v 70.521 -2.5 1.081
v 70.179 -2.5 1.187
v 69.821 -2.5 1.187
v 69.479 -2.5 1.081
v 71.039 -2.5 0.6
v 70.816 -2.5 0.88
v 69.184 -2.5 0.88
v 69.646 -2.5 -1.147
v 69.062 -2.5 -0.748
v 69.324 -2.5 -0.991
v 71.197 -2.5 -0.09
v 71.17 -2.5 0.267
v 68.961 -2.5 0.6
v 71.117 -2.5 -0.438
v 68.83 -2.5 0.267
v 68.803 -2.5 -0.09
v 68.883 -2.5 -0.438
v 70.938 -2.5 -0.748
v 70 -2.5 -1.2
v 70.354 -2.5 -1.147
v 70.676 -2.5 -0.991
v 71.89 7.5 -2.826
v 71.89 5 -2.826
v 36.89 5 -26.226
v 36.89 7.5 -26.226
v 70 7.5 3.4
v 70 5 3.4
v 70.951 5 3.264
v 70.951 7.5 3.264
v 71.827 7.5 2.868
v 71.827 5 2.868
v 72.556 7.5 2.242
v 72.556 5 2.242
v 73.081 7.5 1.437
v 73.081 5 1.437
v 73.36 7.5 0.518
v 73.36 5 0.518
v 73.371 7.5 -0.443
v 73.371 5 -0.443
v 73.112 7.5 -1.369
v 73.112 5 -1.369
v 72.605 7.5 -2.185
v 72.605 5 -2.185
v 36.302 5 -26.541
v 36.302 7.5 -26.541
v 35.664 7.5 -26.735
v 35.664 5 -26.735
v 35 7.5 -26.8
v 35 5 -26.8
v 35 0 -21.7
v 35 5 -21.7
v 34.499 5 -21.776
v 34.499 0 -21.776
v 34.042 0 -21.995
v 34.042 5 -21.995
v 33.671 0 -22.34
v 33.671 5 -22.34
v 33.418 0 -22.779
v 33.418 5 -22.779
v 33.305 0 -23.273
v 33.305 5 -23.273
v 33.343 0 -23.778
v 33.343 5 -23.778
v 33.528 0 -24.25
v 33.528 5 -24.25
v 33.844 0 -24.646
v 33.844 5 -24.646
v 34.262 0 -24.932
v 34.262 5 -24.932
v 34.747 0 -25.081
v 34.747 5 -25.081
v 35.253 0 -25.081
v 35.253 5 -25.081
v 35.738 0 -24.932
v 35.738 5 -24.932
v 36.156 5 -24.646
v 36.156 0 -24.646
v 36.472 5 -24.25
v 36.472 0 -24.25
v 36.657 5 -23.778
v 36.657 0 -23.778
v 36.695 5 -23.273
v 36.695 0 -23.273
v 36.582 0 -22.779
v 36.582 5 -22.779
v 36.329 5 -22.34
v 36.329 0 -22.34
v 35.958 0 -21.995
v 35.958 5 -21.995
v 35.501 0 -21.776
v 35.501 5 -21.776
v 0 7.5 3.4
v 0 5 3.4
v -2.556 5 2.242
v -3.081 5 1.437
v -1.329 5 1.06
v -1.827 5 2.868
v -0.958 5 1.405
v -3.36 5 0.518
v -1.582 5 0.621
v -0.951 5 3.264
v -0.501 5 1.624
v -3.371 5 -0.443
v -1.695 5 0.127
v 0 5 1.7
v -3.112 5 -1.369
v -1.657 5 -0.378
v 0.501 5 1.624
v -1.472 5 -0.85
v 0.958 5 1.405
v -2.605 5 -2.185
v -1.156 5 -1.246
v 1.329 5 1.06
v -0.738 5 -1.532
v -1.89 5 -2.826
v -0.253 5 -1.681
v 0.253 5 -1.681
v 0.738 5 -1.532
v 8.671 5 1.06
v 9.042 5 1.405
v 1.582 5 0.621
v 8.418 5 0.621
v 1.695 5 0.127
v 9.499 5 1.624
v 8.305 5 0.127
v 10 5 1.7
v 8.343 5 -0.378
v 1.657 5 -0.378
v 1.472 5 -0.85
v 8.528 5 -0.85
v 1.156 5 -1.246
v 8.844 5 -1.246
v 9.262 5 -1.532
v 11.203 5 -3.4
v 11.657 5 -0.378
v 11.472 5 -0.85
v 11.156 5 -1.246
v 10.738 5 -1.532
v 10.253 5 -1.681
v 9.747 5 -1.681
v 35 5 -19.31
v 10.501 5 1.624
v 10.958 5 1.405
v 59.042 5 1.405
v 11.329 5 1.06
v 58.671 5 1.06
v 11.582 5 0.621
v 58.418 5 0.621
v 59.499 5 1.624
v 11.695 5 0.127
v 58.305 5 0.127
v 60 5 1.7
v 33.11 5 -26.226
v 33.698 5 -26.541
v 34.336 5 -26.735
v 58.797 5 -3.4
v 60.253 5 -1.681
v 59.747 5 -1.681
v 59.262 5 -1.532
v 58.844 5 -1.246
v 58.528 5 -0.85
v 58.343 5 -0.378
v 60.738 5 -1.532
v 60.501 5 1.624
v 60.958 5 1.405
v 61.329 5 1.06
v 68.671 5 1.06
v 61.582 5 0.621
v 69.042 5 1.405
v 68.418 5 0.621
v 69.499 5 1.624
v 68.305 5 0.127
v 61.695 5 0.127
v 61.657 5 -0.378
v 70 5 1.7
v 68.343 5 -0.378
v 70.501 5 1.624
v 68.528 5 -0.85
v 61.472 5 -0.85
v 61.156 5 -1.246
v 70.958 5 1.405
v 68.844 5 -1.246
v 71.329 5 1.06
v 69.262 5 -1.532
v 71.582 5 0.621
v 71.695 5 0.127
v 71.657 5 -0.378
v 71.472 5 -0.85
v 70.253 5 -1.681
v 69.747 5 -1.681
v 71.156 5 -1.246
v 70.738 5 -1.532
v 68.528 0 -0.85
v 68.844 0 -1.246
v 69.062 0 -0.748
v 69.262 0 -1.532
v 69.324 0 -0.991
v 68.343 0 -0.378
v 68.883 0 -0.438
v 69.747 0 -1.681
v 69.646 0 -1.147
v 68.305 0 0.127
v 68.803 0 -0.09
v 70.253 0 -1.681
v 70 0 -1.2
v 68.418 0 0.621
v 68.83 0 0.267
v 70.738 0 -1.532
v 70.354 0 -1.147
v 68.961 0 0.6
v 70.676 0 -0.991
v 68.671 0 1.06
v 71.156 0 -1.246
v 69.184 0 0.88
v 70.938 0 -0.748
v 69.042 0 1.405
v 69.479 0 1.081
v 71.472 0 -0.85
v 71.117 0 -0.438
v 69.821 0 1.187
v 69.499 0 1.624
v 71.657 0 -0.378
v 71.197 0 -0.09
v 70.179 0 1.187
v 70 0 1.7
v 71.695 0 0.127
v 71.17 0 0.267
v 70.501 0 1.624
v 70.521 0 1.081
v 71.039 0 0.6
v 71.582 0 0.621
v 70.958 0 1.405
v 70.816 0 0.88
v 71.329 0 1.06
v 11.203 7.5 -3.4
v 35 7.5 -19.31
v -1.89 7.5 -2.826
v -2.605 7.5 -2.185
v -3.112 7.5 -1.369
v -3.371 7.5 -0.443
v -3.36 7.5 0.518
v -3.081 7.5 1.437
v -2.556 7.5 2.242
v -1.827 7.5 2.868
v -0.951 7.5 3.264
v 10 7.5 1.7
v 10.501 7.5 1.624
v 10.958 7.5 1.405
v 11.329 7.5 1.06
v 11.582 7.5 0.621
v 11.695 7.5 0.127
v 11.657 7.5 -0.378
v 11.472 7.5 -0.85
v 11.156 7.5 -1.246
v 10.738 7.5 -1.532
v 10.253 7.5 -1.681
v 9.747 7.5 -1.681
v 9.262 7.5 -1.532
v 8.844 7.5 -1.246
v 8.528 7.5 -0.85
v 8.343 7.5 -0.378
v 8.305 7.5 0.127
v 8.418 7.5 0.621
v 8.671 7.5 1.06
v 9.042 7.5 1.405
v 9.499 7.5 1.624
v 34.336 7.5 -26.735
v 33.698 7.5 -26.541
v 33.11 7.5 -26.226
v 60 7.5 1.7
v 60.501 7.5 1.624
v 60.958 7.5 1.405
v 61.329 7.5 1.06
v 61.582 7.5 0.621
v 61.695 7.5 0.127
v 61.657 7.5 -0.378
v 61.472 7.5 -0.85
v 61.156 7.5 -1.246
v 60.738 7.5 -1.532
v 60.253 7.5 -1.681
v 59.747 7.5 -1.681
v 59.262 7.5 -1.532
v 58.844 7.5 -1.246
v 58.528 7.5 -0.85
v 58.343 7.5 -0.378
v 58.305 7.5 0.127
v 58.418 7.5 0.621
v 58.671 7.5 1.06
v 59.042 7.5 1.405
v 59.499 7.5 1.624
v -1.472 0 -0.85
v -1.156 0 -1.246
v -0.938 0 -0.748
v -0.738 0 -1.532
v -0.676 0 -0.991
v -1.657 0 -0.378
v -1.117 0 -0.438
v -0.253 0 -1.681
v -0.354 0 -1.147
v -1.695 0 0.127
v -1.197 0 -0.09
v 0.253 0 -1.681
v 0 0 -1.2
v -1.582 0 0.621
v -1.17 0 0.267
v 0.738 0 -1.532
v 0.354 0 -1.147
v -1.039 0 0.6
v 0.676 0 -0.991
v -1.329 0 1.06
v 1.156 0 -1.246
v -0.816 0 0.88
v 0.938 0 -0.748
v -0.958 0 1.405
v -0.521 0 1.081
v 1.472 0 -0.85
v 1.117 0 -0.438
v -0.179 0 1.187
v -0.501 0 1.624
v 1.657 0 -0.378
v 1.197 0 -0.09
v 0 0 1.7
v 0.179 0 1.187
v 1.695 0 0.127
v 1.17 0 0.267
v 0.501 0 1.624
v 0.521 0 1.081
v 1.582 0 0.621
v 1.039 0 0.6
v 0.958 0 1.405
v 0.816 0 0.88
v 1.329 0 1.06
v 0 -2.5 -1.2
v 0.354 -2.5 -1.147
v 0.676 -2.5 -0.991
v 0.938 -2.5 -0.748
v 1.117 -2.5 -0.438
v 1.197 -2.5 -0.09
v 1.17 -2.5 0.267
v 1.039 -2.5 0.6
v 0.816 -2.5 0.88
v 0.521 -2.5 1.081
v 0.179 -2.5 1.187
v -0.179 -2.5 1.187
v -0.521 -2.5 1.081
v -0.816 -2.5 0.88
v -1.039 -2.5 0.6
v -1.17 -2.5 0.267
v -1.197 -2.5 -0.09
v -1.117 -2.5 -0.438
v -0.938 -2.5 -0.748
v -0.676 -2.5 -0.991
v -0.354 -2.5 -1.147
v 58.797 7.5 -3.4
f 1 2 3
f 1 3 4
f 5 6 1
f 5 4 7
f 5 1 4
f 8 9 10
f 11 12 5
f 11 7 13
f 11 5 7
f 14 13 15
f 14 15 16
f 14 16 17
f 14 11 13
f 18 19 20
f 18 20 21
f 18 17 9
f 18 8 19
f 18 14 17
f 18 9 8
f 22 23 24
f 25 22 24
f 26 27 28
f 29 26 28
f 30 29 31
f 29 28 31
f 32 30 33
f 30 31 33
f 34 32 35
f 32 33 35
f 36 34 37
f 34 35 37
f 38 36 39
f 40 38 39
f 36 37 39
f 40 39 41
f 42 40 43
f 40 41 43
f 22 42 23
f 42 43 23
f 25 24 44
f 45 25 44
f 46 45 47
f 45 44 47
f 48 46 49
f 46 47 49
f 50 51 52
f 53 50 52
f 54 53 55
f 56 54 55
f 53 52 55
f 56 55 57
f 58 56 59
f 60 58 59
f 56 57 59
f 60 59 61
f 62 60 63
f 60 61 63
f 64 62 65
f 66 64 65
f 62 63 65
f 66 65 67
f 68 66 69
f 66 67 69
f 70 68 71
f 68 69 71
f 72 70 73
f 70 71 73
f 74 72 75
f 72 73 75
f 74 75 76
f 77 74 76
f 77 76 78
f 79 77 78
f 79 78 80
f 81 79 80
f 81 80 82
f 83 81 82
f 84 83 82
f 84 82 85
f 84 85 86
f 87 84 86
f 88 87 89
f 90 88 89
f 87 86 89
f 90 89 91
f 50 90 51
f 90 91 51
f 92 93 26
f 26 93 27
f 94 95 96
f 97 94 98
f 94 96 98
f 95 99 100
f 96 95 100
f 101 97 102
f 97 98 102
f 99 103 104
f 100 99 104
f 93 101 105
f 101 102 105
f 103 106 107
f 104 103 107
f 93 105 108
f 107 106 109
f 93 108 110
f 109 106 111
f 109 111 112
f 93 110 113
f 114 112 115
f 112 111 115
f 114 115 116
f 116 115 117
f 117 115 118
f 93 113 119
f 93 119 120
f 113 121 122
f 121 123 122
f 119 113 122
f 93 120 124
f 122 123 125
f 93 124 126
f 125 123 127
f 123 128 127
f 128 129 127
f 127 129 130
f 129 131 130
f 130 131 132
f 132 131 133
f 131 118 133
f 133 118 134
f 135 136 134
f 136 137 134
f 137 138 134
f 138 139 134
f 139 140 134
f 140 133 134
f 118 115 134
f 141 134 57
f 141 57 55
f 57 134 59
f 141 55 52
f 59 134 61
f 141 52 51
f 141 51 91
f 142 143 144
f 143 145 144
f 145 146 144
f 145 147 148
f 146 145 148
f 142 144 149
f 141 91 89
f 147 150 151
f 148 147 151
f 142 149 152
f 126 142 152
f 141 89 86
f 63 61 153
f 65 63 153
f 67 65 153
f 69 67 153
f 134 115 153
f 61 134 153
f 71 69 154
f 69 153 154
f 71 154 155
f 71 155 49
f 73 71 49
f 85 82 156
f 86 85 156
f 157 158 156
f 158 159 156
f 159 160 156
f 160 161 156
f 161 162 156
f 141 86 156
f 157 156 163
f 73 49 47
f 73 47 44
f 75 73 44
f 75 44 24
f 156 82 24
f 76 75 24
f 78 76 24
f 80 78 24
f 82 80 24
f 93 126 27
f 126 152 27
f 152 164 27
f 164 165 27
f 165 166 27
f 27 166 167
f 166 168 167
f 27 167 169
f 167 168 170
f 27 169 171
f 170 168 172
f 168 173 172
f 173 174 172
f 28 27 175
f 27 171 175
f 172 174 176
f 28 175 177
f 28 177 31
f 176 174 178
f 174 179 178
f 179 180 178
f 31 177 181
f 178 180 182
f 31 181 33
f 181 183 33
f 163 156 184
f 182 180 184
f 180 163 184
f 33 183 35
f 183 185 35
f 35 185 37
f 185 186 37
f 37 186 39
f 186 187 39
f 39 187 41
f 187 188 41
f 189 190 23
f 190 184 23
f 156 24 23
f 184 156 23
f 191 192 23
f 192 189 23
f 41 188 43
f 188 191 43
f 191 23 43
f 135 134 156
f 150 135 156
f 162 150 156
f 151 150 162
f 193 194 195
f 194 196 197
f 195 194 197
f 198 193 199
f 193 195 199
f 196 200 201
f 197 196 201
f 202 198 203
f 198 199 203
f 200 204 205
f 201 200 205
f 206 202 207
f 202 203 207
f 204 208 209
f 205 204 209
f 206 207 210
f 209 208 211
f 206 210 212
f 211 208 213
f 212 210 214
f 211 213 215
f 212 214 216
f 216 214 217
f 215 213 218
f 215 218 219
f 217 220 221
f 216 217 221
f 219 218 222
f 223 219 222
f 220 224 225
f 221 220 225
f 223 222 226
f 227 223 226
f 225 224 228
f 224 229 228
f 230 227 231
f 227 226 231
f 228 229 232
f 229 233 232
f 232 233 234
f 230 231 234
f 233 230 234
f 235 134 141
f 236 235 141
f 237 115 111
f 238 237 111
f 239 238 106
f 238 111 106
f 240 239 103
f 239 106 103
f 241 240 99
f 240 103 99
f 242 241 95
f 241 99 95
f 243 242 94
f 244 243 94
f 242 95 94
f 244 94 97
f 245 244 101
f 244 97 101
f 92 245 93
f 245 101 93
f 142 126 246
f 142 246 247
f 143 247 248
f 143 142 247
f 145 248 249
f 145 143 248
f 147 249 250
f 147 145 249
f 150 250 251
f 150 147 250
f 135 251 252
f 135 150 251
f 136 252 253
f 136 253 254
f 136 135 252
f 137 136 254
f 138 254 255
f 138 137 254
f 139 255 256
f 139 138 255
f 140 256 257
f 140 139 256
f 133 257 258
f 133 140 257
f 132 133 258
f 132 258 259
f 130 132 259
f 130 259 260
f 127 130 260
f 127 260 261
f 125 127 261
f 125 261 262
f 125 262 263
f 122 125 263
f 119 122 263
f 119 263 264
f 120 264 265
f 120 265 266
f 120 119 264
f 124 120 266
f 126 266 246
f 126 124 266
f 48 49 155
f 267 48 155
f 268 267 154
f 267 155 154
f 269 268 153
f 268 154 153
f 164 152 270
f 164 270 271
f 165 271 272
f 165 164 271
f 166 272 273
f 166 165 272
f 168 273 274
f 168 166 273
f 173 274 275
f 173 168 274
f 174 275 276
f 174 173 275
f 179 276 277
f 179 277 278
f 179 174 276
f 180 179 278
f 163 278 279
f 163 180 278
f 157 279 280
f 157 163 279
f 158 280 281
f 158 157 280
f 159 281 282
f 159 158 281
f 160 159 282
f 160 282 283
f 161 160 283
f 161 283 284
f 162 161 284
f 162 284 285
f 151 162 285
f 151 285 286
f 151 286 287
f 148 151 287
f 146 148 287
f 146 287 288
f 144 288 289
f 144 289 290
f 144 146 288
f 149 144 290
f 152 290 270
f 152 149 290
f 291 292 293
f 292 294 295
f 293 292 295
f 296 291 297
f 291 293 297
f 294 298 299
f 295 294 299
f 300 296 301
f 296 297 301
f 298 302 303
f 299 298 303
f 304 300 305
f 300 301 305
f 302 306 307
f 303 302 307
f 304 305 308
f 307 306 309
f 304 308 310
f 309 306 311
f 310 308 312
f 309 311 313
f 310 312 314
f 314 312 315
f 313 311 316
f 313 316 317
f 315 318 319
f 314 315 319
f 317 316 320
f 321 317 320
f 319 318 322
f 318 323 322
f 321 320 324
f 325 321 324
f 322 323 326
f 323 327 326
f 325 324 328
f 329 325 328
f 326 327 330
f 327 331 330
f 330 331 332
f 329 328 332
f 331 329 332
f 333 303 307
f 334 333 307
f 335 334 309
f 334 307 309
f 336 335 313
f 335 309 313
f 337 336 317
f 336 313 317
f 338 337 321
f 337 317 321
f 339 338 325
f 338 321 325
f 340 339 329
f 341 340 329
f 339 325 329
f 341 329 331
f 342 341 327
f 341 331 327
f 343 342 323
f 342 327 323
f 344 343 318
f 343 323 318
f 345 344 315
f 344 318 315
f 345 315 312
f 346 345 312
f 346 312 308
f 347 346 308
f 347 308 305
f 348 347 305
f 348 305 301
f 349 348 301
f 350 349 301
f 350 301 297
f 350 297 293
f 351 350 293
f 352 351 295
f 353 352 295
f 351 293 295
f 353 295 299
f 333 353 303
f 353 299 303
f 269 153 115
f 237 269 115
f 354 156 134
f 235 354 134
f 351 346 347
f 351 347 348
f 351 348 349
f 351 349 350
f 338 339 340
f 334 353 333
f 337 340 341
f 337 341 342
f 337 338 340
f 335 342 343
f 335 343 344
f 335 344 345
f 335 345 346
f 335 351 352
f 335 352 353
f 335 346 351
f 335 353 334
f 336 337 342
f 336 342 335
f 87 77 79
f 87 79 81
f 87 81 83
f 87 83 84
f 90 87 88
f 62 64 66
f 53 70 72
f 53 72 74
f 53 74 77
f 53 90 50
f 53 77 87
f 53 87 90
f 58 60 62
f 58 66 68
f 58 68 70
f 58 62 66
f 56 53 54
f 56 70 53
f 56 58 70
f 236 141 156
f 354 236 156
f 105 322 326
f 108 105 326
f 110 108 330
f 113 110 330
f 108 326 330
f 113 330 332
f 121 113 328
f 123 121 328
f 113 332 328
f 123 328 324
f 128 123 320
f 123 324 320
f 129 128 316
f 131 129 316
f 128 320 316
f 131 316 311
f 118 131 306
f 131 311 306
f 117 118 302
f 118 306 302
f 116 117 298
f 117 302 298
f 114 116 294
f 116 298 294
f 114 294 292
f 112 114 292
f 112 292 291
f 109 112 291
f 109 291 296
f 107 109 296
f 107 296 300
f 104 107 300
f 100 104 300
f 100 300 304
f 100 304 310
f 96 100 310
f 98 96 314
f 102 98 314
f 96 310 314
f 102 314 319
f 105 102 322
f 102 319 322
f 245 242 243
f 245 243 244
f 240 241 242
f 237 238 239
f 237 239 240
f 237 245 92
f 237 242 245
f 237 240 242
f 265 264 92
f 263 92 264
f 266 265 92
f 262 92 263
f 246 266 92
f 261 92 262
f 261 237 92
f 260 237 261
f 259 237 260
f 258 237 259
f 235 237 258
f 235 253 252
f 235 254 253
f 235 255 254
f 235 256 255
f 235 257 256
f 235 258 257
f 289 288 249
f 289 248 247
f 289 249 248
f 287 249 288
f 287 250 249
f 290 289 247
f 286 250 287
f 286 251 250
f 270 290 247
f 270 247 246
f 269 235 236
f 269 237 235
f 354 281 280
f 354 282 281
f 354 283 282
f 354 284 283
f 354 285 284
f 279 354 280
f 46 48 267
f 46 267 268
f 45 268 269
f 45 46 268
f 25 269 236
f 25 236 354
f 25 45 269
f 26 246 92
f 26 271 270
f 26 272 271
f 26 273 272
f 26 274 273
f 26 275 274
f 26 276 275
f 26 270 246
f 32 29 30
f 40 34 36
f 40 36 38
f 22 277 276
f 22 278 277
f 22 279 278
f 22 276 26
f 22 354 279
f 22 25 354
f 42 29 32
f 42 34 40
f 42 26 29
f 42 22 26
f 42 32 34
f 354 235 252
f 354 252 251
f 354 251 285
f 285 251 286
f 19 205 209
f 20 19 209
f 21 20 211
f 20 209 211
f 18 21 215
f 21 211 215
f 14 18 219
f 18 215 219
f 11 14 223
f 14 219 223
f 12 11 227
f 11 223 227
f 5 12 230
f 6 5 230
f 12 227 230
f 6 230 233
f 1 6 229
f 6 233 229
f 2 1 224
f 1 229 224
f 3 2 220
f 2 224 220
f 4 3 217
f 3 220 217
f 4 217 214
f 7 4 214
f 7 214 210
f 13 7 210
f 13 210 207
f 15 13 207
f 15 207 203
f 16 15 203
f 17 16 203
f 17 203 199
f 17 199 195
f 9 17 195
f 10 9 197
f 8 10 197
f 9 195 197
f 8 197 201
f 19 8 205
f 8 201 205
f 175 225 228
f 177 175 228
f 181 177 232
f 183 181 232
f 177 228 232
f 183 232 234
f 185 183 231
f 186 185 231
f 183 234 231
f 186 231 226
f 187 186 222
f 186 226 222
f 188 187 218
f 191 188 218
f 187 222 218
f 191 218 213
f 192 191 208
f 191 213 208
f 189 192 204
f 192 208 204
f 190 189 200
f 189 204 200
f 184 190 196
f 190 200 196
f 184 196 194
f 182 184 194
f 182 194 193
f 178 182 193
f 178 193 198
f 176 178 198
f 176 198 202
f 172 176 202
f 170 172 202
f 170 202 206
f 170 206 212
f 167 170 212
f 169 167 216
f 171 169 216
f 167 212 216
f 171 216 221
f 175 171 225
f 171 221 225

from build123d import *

# Parameters (mm, degrees)
SKETCH1_R             = 1.7
BOSS_EXTRUDE1_DEPTH   = 5
BOSS_EXTRUDE1_2_DEPTH = 5
SKETCH2_R             = 1.7
BOSS_EXTRUDE5_DEPTH   = 2.5
SKETCH3_R             = 1.2
BOSS_EXTRUDE6_DEPTH   = 2.5
SKETCH4_R             = 1.7
BOSS_EXTRUDE7_DEPTH   = 5


with BuildPart() as part:
    # Sketch1 → Boss-Extrude1 (new body)
    with BuildSketch(Plane(origin=(0, 0, 0), x_dir=(1, 0, 0), z_dir=(0, 1, 0))):
        with Locations(Location((0, 0, 0), (0, 0, 270))):
            Circle(SKETCH1_R)
    extrude(amount=BOSS_EXTRUDE1_DEPTH)



with BuildPart() as body_2:
    # Sketch1 → Boss-Extrude1 2 (new body)
    with BuildSketch(Plane(origin=(0, 0, 0), x_dir=(1, 0, 0), z_dir=(0, 1, 0))):
        with Locations(Location((70, 0, 0), (0, 0, 270))):
            Circle(SKETCH1_R)
    extrude(amount=BOSS_EXTRUDE1_2_DEPTH)


with BuildPart() as part_1:
    add(part.part)

    add(body_2.part)  # Boss-Extrude5 merges body 2
    # Sketch2 → Boss-Extrude5 (add)
    # profile 1 of 4: a face of its own
    with BuildSketch(Plane(origin=(0, 5, 0), x_dir=(1, 0, 0), z_dir=(0, 1, 0))):
        with BuildLine():
            ThreePointArc((-1.889706262, 2.826483725), (-0.987409575, 3.253463129), (0, 3.4))
            Line((0, 3.4), (11.202822944, 3.4))
            Line((11.202822944, 3.4), (35, 19.310112661))
            Line((35, 19.310112661), (35, 23.4))
            Line((35, 23.4), (35, 26.8))
            ThreePointArc((35, 26.8), (34.012590425, 26.653463129), (33.110293738, 26.226483725))
            Line((33.110293738, 26.226483725), (-1.889706262, 2.826483725))
        make_face()
    # profile 2 of 4: a face of its own
    with BuildSketch(Plane(origin=(0, 5, 0), x_dir=(1, 0, 0), z_dir=(0, 1, 0))):
        with BuildLine():
            Line((0, -3.4), (70, -3.4))
            ThreePointArc((70, -3.4), (73.4, 0), (70, 3.4))
            Line((70, 3.4), (0, 3.4))
            ThreePointArc((0, 3.4), (-3.4, 0), (0, -3.4))
        make_face()
        with Locations(Location((10, 0, 0), (0, 0, 270))):
            Circle(SKETCH2_R, mode=Mode.SUBTRACT)
        with Locations(Location((60, 0, 0), (0, 0, 270))):
            Circle(SKETCH2_R, mode=Mode.SUBTRACT)
        with Locations(Location((0, 0, 0), (0, 0, 270))):
            Circle(SKETCH2_R, mode=Mode.SUBTRACT)
    # profile 3 of 4: a face of its own
    with BuildSketch(Plane(origin=(0, 5, 0), x_dir=(1, 0, 0), z_dir=(0, 1, 0))):
        with Locations(Location((0, 0, 0), (0, 0, 270))):
            Circle(SKETCH2_R)
    # profile 4 of 4: a face of its own
    with BuildSketch(Plane(origin=(0, 5, 0), x_dir=(1, 0, 0), z_dir=(0, 1, 0))):
        with BuildLine():
            Line((35, 23.4), (35, 19.310112661))
            Line((35, 19.310112661), (58.797177056, 3.4))
            Line((58.797177056, 3.4), (70, 3.4))
            ThreePointArc((70, 3.4), (70.987409575, 3.253463129), (71.889706262, 2.826483725))
            Line((71.889706262, 2.826483725), (36.889706262, 26.226483725))
            ThreePointArc((36.889706262, 26.226483725), (35.987409575, 26.653463129), (35, 26.8))
            Line((35, 26.8), (35, 23.4))
        make_face()
    extrude(amount=BOSS_EXTRUDE5_DEPTH)

    # Sketch3 → Boss-Extrude6 (add)
    with BuildSketch(Plane.XZ):
        with Locations(Location((0, 0, 0), (0, 0, 270))):
            Circle(SKETCH3_R)
        with Locations(Location((70, 0, 0), (0, 0, 270))):
            Circle(SKETCH3_R)
    extrude(amount=BOSS_EXTRUDE6_DEPTH)

    # Sketch4 → Boss-Extrude7 (add)
    with BuildSketch(Plane.XZ.offset(-5)):
        with Locations(Location((35, -23.4, 0), (0, 0, 90))):
            Circle(SKETCH4_R)
    extrude(amount=BOSS_EXTRUDE7_DEPTH)


solid = part_1.part
